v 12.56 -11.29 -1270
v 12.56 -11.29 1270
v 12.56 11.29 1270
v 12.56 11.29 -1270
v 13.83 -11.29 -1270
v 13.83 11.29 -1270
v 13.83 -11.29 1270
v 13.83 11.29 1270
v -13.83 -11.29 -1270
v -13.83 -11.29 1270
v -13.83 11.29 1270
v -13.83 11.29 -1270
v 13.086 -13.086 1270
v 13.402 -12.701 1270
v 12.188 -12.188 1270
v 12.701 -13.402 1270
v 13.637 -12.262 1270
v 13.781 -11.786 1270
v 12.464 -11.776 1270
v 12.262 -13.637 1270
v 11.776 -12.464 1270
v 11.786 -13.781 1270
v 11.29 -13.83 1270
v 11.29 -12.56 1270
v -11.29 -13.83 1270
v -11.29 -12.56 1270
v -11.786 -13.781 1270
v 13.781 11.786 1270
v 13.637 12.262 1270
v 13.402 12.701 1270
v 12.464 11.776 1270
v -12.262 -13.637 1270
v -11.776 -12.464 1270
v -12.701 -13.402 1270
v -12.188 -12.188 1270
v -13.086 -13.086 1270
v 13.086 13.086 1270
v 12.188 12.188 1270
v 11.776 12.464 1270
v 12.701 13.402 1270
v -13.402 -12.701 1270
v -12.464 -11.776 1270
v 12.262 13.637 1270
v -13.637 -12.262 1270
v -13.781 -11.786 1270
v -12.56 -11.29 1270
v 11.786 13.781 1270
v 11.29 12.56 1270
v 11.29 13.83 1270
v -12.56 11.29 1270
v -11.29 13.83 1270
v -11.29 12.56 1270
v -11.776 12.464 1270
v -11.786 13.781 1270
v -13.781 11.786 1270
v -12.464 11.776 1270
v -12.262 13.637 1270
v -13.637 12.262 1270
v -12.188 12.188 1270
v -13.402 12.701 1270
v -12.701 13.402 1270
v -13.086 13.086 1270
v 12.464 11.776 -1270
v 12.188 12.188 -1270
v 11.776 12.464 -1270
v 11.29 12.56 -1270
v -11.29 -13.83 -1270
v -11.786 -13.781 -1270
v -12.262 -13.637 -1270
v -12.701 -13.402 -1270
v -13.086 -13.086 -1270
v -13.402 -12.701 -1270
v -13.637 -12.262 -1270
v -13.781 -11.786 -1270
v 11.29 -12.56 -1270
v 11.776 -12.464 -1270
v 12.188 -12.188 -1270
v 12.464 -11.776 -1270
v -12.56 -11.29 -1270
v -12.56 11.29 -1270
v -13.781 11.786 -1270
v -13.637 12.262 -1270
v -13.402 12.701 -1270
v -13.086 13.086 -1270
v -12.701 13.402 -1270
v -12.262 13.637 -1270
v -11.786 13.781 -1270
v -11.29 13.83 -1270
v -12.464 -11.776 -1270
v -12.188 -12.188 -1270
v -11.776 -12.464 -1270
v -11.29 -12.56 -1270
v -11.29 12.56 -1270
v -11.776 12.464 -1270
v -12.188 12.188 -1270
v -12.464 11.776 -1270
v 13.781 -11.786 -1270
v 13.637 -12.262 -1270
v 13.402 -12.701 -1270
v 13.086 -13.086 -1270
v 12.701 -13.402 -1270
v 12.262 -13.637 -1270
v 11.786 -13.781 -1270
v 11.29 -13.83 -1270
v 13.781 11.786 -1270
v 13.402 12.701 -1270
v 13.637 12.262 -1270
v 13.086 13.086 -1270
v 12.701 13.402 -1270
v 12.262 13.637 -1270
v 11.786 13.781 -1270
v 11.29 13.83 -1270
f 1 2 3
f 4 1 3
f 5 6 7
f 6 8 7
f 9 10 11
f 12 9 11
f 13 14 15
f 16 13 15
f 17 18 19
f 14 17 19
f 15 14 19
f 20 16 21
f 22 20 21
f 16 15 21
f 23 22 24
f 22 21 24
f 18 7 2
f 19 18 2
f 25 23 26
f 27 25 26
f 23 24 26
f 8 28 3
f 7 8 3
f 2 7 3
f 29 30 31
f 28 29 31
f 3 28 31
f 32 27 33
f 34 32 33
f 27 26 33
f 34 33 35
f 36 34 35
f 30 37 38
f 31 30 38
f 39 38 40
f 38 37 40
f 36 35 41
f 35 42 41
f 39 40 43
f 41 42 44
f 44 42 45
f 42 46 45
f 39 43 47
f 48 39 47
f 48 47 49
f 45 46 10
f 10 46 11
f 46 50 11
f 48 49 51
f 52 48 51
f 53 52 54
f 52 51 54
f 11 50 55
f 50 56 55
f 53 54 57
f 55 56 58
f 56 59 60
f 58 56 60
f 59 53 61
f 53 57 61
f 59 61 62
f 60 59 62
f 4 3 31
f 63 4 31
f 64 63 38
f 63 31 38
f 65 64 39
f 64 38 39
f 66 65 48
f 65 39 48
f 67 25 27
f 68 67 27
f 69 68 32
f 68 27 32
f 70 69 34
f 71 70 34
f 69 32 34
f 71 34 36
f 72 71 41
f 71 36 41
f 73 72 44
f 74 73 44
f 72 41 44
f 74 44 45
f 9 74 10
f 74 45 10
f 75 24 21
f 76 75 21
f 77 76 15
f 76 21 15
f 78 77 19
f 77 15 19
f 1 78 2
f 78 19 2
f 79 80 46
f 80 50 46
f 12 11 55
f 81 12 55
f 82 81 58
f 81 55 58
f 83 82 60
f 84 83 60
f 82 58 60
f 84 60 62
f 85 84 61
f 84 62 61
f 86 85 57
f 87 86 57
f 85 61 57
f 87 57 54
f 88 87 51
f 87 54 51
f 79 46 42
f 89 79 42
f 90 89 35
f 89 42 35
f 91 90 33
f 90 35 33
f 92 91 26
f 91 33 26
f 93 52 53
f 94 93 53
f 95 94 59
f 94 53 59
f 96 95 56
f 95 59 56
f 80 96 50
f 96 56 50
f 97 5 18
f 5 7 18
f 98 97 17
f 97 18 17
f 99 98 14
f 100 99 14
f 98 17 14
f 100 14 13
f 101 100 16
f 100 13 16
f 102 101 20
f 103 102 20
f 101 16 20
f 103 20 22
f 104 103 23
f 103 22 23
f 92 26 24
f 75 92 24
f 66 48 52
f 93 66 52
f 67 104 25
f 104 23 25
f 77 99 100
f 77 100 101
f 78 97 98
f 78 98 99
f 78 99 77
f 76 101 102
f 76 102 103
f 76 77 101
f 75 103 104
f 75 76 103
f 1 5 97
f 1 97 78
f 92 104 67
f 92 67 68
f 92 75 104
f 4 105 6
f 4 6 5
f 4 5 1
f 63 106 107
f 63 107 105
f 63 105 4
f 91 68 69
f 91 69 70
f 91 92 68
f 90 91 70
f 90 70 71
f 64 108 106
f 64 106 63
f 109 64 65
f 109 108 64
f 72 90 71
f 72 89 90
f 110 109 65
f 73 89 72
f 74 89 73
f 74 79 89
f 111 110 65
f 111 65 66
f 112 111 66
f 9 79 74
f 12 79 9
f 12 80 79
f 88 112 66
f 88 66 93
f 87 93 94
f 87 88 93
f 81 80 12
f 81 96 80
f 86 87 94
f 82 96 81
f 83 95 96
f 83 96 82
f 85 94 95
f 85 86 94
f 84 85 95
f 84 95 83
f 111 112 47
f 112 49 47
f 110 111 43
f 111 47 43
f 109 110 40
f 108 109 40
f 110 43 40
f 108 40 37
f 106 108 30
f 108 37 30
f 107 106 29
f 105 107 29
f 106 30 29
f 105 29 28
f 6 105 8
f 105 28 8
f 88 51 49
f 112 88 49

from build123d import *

# Parameters (mm, degrees)
BOSS_EXTRUDE1_DEPTH = 1270


with BuildPart() as part:
    # Sketch1 → Boss-Extrude1 (new body, symmetric)
    with BuildSketch(Plane.XY):
        with BuildLine():
            Line((-11.2903, 13.8303), (11.2903, 13.8303))
            ThreePointArc((11.2903, 13.8303), (13.086351224, 13.086351224), (13.8303, 11.2903))
            Line((13.8303, 11.2903), (13.8303, -11.2903))
            ThreePointArc((13.8303, -11.2903), (13.086351224, -13.086351224), (11.2903, -13.8303))
            Line((11.2903, -13.8303), (-11.2903, -13.8303))
            ThreePointArc((-11.2903, -13.8303), (-13.086351224, -13.086351224), (-13.8303, -11.2903))
            Line((-13.8303, -11.2903), (-13.8303, 11.2903))
            ThreePointArc((-13.8303, 11.2903), (-13.086351224, 13.086351224), (-11.2903, 13.8303))
        make_face()
        with BuildLine():
            Line((-12.5603, 11.2903), (-12.5603, -11.2903))
            ThreePointArc((-12.5603, -11.2903), (-12.188325612, -12.188325612), (-11.2903, -12.5603))
            Line((-11.2903, -12.5603), (11.2903, -12.5603))
            ThreePointArc((11.2903, -12.5603), (12.188325612, -12.188325612), (12.5603, -11.2903))
            Line((12.5603, -11.2903), (12.5603, 11.2903))
            ThreePointArc((12.5603, 11.2903), (12.188325612, 12.188325612), (11.2903, 12.5603))
            Line((11.2903, 12.5603), (-11.2903, 12.5603))
            ThreePointArc((-11.2903, 12.5603), (-12.188325612, 12.188325612), (-12.5603, 11.2903))
        make_face(mode=Mode.SUBTRACT)
    extrude(amount=BOSS_EXTRUDE1_DEPTH, both=True)


solid = part.part
